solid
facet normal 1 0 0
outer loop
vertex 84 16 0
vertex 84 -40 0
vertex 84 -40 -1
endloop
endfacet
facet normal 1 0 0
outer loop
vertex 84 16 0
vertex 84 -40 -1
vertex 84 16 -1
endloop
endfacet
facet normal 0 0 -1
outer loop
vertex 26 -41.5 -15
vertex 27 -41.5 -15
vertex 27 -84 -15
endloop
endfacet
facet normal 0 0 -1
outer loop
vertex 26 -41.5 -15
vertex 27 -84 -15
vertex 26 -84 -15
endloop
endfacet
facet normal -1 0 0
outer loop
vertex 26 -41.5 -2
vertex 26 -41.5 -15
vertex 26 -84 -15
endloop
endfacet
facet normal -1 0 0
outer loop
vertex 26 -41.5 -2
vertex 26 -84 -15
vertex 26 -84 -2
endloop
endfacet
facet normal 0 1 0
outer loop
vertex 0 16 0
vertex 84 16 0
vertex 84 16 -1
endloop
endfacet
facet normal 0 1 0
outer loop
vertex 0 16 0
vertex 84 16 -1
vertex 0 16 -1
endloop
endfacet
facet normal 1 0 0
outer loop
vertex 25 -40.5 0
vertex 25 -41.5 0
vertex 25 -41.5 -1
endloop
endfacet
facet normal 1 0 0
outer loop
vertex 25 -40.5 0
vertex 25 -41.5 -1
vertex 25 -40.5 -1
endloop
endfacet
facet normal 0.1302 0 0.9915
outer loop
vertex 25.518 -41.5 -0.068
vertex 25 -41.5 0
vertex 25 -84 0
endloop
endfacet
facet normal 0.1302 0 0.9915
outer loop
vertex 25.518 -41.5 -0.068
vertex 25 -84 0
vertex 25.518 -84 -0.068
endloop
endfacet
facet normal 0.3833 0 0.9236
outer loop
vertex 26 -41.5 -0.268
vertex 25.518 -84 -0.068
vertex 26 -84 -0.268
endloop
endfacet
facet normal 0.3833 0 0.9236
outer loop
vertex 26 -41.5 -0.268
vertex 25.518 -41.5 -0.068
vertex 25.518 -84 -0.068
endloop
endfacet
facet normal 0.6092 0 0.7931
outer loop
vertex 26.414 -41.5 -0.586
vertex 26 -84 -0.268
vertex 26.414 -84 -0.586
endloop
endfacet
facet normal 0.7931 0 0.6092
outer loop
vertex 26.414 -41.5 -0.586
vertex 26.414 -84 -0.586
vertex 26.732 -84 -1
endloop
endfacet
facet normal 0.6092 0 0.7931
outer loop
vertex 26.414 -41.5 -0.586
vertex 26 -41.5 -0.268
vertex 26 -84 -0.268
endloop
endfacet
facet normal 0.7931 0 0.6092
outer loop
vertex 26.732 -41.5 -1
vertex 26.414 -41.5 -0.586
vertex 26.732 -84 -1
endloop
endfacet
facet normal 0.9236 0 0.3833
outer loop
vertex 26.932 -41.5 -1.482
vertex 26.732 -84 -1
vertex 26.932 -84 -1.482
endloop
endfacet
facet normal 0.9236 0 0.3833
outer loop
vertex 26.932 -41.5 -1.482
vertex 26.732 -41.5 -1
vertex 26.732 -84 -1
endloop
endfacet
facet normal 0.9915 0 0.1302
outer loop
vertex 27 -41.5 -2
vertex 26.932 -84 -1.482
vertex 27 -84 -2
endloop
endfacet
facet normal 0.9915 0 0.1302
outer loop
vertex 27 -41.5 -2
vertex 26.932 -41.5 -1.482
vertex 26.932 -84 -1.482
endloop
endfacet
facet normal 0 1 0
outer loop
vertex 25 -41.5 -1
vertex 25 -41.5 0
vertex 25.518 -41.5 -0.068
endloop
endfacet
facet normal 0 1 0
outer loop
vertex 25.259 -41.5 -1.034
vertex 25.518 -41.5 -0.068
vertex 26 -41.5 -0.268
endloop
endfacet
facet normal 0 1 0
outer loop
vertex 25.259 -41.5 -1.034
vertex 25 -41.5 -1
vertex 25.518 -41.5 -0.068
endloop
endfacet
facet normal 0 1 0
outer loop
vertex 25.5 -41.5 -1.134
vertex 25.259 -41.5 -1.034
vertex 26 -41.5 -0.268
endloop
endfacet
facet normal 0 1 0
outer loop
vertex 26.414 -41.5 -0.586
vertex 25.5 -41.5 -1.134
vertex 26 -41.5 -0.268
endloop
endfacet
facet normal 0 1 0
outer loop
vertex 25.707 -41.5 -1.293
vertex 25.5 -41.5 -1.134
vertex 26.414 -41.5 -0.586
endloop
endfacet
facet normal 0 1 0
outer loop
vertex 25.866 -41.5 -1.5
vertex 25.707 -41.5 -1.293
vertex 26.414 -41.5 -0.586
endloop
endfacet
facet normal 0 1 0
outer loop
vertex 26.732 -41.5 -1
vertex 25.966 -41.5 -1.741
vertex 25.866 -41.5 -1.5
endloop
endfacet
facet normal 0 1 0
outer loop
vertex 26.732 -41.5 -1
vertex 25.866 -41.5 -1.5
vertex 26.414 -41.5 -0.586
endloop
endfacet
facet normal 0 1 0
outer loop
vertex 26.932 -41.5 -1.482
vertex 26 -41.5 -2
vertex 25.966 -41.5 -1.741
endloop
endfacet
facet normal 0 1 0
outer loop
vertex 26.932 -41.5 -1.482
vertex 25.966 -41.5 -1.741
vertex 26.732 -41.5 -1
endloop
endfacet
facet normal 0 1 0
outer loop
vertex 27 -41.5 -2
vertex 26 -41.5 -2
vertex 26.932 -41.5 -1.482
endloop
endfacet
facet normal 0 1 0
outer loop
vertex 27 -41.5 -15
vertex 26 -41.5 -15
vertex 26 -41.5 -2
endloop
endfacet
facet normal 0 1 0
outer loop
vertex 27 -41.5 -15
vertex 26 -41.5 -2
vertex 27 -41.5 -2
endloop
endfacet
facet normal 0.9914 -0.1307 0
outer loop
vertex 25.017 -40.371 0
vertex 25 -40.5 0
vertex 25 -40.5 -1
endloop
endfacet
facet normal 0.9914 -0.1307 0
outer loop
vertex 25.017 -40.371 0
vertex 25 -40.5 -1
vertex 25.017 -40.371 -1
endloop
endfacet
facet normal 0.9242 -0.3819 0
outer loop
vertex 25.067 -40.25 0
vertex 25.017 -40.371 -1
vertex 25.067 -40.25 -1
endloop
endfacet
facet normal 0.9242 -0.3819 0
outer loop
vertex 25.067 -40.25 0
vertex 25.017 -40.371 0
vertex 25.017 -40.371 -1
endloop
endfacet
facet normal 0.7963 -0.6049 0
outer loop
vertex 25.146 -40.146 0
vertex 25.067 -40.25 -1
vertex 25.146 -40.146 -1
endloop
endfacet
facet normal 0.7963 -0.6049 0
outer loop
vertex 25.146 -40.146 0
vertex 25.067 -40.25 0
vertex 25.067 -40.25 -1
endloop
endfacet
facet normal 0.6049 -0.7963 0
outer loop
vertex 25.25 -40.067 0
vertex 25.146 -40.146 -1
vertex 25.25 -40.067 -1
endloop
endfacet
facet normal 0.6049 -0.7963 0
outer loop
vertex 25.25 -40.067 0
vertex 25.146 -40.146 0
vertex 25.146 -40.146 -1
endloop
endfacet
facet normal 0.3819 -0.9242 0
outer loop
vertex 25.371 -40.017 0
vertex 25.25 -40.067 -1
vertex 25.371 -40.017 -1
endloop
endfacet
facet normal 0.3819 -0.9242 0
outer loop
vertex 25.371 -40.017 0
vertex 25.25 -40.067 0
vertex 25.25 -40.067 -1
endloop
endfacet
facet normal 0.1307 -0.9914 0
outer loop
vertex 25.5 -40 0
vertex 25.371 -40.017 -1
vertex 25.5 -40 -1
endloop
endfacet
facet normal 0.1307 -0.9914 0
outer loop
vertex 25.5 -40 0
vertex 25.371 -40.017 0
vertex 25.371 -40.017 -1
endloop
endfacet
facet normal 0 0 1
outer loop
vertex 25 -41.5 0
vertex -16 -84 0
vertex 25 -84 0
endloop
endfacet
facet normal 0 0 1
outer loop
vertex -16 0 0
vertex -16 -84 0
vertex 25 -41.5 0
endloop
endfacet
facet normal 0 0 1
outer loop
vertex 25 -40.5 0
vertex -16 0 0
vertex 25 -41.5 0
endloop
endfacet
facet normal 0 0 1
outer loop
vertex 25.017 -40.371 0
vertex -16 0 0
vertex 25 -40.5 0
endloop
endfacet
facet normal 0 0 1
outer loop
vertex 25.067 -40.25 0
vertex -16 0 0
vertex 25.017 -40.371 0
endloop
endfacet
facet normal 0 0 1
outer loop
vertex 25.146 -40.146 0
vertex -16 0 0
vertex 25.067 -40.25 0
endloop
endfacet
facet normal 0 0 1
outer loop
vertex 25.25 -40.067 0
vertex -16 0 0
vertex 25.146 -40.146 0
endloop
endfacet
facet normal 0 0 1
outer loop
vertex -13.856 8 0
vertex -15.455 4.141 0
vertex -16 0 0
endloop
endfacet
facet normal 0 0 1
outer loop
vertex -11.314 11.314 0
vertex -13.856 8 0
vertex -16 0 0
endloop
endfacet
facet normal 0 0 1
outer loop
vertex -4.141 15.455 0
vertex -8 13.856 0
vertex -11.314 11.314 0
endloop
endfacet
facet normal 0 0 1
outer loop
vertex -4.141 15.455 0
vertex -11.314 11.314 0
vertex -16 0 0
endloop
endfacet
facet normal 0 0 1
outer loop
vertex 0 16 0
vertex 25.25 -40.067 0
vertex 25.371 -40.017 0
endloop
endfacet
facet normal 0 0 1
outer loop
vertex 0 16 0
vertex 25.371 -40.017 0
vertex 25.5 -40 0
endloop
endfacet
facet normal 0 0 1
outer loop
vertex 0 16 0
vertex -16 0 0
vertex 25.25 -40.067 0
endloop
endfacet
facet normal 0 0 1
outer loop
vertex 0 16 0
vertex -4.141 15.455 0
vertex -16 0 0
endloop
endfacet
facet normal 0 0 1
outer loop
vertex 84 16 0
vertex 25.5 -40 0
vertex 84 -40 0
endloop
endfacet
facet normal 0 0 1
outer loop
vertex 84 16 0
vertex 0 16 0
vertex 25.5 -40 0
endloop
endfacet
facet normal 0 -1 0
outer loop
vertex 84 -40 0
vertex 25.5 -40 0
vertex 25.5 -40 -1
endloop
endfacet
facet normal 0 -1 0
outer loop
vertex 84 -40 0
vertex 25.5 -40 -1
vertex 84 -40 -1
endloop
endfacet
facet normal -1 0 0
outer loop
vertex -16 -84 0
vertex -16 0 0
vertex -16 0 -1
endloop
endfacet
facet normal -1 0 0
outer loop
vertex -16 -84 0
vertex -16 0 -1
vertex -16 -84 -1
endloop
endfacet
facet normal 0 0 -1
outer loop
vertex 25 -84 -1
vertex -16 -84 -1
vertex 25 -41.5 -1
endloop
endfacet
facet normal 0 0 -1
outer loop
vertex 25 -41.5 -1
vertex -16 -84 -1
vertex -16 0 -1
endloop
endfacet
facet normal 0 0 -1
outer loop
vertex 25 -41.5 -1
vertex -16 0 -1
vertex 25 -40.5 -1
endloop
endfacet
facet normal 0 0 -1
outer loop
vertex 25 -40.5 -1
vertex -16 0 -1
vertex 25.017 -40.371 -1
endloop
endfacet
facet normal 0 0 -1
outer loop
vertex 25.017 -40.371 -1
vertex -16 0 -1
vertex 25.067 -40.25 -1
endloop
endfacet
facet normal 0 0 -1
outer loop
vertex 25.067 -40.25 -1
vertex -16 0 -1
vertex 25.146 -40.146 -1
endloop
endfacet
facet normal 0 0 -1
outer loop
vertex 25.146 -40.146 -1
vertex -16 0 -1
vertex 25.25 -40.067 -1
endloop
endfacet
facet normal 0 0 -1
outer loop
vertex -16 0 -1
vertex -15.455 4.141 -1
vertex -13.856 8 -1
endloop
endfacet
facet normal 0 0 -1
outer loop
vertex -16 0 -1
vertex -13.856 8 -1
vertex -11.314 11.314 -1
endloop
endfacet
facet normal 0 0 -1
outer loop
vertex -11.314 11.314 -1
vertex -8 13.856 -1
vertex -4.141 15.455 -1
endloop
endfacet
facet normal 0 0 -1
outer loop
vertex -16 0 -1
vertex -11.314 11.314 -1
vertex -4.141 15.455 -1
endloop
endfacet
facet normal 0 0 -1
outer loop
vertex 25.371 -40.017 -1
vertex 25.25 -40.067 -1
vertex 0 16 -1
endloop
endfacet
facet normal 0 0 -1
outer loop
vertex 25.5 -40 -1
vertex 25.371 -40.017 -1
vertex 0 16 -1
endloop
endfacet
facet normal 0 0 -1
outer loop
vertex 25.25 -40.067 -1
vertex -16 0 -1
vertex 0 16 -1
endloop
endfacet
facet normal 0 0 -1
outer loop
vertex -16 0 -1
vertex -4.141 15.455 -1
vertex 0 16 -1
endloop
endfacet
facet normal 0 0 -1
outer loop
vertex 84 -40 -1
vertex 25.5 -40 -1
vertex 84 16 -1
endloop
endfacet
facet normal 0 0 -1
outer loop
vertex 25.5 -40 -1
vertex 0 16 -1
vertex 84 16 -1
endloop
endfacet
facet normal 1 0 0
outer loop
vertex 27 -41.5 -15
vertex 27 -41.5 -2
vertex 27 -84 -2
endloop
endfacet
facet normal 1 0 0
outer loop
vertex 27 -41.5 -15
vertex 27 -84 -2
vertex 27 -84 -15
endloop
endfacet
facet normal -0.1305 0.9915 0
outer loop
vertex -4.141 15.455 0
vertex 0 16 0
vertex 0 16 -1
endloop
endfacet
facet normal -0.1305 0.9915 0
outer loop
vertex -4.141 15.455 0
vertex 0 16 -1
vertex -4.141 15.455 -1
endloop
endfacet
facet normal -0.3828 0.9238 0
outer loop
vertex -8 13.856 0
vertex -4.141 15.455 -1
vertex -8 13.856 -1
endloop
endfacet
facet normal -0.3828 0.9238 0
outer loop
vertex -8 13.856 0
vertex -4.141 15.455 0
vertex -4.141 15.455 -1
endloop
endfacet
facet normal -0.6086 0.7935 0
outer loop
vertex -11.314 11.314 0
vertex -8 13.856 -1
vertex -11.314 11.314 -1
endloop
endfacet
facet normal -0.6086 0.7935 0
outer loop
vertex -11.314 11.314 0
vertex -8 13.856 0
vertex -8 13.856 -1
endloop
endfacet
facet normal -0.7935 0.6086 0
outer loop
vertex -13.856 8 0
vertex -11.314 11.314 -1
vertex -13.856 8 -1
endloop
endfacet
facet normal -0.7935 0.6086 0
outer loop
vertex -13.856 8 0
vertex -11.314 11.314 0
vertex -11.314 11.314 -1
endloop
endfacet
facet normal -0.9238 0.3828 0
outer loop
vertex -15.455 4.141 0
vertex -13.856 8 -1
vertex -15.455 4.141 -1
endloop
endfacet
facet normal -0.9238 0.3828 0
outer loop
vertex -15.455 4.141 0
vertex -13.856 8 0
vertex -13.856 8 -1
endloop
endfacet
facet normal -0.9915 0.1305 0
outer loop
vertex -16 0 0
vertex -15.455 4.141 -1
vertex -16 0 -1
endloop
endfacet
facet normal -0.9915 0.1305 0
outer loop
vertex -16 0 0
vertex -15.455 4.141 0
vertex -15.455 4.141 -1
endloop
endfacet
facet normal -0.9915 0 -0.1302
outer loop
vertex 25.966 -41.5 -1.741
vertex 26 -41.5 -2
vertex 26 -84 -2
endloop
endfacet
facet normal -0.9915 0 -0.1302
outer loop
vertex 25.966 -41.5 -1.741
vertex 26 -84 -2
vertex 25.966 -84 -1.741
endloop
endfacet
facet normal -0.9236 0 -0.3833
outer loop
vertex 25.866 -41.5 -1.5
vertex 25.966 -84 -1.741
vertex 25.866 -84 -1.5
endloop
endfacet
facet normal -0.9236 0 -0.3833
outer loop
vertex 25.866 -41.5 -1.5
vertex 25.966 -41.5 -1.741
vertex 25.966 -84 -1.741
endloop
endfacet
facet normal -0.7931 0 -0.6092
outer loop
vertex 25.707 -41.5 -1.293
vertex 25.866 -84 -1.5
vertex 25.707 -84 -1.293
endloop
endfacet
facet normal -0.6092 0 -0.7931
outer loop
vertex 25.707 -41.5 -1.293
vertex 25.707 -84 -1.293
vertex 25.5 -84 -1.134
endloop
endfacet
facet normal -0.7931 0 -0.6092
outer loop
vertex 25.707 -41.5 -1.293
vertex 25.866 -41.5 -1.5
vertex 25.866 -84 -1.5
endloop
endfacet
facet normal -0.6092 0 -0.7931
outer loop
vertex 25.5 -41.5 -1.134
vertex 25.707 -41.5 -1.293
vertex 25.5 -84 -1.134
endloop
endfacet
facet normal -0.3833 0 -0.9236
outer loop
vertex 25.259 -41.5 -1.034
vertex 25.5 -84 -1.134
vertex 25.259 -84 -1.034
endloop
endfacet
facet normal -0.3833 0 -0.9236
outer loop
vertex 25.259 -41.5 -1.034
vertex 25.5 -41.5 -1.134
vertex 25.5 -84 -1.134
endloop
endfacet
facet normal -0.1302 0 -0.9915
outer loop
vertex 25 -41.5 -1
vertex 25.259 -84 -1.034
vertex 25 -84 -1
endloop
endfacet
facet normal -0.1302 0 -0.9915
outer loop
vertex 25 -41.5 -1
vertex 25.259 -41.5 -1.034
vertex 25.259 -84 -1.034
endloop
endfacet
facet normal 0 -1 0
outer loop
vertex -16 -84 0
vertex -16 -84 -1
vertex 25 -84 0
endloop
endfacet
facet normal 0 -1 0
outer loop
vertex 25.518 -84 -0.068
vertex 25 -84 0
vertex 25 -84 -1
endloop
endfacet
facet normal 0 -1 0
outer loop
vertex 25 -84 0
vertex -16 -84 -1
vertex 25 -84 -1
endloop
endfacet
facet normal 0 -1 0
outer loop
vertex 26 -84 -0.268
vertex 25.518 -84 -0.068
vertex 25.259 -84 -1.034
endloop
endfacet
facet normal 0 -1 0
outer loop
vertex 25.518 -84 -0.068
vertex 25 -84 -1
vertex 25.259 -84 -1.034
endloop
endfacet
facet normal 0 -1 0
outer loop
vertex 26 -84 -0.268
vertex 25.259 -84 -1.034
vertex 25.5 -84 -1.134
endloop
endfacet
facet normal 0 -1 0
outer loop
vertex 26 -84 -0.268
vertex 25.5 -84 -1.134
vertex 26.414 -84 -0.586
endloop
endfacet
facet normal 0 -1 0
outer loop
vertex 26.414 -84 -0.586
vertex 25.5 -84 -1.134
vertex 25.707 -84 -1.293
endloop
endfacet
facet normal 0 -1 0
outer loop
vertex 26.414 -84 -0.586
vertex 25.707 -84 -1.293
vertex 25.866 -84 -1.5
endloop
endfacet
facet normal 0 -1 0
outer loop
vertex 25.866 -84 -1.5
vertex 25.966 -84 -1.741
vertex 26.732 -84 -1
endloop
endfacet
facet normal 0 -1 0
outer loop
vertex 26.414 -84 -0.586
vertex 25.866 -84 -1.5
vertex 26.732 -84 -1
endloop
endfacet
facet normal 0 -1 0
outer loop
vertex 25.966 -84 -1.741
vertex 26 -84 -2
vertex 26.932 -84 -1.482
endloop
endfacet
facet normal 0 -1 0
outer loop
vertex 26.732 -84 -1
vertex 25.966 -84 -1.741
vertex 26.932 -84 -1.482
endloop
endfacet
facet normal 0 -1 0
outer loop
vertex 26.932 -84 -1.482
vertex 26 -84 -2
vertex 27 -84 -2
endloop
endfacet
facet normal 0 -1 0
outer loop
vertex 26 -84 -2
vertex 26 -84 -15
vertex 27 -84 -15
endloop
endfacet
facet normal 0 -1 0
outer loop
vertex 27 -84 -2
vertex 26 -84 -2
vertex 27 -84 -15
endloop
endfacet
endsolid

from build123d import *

# Parameters (mm, degrees)
BASE_FLANGE1_DEPTH = 1
EDGE_FLANGE2_DEPTH = 42.5


# Sheet-metal steps are written as plain solids
with BuildPart() as part:
    # Sketch1 → Base-Flange1 (new body)
    with BuildSketch(Plane.XY):
        with BuildLine():
            Line((-16, 0), (-16, -84))
            Line((-16, -84), (25, -84))
            Line((25, -84), (25, -40.5))
            ThreePointArc((25, -40.5), (25.146446609, -40.146446609), (25.5, -40))
            Line((25.5, -40), (84, -40))
            Line((84, -40), (84, 16))
            Line((84, 16), (0, 16))
            ThreePointArc((0, 16), (-11.313708499, 11.313708499), (-16, 0))
        make_face()
    extrude(amount=-BASE_FLANGE1_DEPTH)

    # Edge-Flange2 section (across the edge) → Edge-Flange2 (add)
    with BuildSketch(Plane(origin=(26, -41.5, -1), x_dir=(-1, 0, 0), z_dir=(0, -1, 0))):
        with BuildLine():
            Line((-1, 1), (-1, 14))
            Line((-1, 14), (0, 14))
            Line((0, 14), (0, 1))
            ThreePointArc((0, 1), (0.292893219, 0.292893219), (1, 0))
            Line((1, 0), (1, -1))
            ThreePointArc((1, -1), (-0.414213562, -0.414213562), (-1, 1))
        make_face()
    extrude(amount=EDGE_FLANGE2_DEPTH)


solid = part.part
